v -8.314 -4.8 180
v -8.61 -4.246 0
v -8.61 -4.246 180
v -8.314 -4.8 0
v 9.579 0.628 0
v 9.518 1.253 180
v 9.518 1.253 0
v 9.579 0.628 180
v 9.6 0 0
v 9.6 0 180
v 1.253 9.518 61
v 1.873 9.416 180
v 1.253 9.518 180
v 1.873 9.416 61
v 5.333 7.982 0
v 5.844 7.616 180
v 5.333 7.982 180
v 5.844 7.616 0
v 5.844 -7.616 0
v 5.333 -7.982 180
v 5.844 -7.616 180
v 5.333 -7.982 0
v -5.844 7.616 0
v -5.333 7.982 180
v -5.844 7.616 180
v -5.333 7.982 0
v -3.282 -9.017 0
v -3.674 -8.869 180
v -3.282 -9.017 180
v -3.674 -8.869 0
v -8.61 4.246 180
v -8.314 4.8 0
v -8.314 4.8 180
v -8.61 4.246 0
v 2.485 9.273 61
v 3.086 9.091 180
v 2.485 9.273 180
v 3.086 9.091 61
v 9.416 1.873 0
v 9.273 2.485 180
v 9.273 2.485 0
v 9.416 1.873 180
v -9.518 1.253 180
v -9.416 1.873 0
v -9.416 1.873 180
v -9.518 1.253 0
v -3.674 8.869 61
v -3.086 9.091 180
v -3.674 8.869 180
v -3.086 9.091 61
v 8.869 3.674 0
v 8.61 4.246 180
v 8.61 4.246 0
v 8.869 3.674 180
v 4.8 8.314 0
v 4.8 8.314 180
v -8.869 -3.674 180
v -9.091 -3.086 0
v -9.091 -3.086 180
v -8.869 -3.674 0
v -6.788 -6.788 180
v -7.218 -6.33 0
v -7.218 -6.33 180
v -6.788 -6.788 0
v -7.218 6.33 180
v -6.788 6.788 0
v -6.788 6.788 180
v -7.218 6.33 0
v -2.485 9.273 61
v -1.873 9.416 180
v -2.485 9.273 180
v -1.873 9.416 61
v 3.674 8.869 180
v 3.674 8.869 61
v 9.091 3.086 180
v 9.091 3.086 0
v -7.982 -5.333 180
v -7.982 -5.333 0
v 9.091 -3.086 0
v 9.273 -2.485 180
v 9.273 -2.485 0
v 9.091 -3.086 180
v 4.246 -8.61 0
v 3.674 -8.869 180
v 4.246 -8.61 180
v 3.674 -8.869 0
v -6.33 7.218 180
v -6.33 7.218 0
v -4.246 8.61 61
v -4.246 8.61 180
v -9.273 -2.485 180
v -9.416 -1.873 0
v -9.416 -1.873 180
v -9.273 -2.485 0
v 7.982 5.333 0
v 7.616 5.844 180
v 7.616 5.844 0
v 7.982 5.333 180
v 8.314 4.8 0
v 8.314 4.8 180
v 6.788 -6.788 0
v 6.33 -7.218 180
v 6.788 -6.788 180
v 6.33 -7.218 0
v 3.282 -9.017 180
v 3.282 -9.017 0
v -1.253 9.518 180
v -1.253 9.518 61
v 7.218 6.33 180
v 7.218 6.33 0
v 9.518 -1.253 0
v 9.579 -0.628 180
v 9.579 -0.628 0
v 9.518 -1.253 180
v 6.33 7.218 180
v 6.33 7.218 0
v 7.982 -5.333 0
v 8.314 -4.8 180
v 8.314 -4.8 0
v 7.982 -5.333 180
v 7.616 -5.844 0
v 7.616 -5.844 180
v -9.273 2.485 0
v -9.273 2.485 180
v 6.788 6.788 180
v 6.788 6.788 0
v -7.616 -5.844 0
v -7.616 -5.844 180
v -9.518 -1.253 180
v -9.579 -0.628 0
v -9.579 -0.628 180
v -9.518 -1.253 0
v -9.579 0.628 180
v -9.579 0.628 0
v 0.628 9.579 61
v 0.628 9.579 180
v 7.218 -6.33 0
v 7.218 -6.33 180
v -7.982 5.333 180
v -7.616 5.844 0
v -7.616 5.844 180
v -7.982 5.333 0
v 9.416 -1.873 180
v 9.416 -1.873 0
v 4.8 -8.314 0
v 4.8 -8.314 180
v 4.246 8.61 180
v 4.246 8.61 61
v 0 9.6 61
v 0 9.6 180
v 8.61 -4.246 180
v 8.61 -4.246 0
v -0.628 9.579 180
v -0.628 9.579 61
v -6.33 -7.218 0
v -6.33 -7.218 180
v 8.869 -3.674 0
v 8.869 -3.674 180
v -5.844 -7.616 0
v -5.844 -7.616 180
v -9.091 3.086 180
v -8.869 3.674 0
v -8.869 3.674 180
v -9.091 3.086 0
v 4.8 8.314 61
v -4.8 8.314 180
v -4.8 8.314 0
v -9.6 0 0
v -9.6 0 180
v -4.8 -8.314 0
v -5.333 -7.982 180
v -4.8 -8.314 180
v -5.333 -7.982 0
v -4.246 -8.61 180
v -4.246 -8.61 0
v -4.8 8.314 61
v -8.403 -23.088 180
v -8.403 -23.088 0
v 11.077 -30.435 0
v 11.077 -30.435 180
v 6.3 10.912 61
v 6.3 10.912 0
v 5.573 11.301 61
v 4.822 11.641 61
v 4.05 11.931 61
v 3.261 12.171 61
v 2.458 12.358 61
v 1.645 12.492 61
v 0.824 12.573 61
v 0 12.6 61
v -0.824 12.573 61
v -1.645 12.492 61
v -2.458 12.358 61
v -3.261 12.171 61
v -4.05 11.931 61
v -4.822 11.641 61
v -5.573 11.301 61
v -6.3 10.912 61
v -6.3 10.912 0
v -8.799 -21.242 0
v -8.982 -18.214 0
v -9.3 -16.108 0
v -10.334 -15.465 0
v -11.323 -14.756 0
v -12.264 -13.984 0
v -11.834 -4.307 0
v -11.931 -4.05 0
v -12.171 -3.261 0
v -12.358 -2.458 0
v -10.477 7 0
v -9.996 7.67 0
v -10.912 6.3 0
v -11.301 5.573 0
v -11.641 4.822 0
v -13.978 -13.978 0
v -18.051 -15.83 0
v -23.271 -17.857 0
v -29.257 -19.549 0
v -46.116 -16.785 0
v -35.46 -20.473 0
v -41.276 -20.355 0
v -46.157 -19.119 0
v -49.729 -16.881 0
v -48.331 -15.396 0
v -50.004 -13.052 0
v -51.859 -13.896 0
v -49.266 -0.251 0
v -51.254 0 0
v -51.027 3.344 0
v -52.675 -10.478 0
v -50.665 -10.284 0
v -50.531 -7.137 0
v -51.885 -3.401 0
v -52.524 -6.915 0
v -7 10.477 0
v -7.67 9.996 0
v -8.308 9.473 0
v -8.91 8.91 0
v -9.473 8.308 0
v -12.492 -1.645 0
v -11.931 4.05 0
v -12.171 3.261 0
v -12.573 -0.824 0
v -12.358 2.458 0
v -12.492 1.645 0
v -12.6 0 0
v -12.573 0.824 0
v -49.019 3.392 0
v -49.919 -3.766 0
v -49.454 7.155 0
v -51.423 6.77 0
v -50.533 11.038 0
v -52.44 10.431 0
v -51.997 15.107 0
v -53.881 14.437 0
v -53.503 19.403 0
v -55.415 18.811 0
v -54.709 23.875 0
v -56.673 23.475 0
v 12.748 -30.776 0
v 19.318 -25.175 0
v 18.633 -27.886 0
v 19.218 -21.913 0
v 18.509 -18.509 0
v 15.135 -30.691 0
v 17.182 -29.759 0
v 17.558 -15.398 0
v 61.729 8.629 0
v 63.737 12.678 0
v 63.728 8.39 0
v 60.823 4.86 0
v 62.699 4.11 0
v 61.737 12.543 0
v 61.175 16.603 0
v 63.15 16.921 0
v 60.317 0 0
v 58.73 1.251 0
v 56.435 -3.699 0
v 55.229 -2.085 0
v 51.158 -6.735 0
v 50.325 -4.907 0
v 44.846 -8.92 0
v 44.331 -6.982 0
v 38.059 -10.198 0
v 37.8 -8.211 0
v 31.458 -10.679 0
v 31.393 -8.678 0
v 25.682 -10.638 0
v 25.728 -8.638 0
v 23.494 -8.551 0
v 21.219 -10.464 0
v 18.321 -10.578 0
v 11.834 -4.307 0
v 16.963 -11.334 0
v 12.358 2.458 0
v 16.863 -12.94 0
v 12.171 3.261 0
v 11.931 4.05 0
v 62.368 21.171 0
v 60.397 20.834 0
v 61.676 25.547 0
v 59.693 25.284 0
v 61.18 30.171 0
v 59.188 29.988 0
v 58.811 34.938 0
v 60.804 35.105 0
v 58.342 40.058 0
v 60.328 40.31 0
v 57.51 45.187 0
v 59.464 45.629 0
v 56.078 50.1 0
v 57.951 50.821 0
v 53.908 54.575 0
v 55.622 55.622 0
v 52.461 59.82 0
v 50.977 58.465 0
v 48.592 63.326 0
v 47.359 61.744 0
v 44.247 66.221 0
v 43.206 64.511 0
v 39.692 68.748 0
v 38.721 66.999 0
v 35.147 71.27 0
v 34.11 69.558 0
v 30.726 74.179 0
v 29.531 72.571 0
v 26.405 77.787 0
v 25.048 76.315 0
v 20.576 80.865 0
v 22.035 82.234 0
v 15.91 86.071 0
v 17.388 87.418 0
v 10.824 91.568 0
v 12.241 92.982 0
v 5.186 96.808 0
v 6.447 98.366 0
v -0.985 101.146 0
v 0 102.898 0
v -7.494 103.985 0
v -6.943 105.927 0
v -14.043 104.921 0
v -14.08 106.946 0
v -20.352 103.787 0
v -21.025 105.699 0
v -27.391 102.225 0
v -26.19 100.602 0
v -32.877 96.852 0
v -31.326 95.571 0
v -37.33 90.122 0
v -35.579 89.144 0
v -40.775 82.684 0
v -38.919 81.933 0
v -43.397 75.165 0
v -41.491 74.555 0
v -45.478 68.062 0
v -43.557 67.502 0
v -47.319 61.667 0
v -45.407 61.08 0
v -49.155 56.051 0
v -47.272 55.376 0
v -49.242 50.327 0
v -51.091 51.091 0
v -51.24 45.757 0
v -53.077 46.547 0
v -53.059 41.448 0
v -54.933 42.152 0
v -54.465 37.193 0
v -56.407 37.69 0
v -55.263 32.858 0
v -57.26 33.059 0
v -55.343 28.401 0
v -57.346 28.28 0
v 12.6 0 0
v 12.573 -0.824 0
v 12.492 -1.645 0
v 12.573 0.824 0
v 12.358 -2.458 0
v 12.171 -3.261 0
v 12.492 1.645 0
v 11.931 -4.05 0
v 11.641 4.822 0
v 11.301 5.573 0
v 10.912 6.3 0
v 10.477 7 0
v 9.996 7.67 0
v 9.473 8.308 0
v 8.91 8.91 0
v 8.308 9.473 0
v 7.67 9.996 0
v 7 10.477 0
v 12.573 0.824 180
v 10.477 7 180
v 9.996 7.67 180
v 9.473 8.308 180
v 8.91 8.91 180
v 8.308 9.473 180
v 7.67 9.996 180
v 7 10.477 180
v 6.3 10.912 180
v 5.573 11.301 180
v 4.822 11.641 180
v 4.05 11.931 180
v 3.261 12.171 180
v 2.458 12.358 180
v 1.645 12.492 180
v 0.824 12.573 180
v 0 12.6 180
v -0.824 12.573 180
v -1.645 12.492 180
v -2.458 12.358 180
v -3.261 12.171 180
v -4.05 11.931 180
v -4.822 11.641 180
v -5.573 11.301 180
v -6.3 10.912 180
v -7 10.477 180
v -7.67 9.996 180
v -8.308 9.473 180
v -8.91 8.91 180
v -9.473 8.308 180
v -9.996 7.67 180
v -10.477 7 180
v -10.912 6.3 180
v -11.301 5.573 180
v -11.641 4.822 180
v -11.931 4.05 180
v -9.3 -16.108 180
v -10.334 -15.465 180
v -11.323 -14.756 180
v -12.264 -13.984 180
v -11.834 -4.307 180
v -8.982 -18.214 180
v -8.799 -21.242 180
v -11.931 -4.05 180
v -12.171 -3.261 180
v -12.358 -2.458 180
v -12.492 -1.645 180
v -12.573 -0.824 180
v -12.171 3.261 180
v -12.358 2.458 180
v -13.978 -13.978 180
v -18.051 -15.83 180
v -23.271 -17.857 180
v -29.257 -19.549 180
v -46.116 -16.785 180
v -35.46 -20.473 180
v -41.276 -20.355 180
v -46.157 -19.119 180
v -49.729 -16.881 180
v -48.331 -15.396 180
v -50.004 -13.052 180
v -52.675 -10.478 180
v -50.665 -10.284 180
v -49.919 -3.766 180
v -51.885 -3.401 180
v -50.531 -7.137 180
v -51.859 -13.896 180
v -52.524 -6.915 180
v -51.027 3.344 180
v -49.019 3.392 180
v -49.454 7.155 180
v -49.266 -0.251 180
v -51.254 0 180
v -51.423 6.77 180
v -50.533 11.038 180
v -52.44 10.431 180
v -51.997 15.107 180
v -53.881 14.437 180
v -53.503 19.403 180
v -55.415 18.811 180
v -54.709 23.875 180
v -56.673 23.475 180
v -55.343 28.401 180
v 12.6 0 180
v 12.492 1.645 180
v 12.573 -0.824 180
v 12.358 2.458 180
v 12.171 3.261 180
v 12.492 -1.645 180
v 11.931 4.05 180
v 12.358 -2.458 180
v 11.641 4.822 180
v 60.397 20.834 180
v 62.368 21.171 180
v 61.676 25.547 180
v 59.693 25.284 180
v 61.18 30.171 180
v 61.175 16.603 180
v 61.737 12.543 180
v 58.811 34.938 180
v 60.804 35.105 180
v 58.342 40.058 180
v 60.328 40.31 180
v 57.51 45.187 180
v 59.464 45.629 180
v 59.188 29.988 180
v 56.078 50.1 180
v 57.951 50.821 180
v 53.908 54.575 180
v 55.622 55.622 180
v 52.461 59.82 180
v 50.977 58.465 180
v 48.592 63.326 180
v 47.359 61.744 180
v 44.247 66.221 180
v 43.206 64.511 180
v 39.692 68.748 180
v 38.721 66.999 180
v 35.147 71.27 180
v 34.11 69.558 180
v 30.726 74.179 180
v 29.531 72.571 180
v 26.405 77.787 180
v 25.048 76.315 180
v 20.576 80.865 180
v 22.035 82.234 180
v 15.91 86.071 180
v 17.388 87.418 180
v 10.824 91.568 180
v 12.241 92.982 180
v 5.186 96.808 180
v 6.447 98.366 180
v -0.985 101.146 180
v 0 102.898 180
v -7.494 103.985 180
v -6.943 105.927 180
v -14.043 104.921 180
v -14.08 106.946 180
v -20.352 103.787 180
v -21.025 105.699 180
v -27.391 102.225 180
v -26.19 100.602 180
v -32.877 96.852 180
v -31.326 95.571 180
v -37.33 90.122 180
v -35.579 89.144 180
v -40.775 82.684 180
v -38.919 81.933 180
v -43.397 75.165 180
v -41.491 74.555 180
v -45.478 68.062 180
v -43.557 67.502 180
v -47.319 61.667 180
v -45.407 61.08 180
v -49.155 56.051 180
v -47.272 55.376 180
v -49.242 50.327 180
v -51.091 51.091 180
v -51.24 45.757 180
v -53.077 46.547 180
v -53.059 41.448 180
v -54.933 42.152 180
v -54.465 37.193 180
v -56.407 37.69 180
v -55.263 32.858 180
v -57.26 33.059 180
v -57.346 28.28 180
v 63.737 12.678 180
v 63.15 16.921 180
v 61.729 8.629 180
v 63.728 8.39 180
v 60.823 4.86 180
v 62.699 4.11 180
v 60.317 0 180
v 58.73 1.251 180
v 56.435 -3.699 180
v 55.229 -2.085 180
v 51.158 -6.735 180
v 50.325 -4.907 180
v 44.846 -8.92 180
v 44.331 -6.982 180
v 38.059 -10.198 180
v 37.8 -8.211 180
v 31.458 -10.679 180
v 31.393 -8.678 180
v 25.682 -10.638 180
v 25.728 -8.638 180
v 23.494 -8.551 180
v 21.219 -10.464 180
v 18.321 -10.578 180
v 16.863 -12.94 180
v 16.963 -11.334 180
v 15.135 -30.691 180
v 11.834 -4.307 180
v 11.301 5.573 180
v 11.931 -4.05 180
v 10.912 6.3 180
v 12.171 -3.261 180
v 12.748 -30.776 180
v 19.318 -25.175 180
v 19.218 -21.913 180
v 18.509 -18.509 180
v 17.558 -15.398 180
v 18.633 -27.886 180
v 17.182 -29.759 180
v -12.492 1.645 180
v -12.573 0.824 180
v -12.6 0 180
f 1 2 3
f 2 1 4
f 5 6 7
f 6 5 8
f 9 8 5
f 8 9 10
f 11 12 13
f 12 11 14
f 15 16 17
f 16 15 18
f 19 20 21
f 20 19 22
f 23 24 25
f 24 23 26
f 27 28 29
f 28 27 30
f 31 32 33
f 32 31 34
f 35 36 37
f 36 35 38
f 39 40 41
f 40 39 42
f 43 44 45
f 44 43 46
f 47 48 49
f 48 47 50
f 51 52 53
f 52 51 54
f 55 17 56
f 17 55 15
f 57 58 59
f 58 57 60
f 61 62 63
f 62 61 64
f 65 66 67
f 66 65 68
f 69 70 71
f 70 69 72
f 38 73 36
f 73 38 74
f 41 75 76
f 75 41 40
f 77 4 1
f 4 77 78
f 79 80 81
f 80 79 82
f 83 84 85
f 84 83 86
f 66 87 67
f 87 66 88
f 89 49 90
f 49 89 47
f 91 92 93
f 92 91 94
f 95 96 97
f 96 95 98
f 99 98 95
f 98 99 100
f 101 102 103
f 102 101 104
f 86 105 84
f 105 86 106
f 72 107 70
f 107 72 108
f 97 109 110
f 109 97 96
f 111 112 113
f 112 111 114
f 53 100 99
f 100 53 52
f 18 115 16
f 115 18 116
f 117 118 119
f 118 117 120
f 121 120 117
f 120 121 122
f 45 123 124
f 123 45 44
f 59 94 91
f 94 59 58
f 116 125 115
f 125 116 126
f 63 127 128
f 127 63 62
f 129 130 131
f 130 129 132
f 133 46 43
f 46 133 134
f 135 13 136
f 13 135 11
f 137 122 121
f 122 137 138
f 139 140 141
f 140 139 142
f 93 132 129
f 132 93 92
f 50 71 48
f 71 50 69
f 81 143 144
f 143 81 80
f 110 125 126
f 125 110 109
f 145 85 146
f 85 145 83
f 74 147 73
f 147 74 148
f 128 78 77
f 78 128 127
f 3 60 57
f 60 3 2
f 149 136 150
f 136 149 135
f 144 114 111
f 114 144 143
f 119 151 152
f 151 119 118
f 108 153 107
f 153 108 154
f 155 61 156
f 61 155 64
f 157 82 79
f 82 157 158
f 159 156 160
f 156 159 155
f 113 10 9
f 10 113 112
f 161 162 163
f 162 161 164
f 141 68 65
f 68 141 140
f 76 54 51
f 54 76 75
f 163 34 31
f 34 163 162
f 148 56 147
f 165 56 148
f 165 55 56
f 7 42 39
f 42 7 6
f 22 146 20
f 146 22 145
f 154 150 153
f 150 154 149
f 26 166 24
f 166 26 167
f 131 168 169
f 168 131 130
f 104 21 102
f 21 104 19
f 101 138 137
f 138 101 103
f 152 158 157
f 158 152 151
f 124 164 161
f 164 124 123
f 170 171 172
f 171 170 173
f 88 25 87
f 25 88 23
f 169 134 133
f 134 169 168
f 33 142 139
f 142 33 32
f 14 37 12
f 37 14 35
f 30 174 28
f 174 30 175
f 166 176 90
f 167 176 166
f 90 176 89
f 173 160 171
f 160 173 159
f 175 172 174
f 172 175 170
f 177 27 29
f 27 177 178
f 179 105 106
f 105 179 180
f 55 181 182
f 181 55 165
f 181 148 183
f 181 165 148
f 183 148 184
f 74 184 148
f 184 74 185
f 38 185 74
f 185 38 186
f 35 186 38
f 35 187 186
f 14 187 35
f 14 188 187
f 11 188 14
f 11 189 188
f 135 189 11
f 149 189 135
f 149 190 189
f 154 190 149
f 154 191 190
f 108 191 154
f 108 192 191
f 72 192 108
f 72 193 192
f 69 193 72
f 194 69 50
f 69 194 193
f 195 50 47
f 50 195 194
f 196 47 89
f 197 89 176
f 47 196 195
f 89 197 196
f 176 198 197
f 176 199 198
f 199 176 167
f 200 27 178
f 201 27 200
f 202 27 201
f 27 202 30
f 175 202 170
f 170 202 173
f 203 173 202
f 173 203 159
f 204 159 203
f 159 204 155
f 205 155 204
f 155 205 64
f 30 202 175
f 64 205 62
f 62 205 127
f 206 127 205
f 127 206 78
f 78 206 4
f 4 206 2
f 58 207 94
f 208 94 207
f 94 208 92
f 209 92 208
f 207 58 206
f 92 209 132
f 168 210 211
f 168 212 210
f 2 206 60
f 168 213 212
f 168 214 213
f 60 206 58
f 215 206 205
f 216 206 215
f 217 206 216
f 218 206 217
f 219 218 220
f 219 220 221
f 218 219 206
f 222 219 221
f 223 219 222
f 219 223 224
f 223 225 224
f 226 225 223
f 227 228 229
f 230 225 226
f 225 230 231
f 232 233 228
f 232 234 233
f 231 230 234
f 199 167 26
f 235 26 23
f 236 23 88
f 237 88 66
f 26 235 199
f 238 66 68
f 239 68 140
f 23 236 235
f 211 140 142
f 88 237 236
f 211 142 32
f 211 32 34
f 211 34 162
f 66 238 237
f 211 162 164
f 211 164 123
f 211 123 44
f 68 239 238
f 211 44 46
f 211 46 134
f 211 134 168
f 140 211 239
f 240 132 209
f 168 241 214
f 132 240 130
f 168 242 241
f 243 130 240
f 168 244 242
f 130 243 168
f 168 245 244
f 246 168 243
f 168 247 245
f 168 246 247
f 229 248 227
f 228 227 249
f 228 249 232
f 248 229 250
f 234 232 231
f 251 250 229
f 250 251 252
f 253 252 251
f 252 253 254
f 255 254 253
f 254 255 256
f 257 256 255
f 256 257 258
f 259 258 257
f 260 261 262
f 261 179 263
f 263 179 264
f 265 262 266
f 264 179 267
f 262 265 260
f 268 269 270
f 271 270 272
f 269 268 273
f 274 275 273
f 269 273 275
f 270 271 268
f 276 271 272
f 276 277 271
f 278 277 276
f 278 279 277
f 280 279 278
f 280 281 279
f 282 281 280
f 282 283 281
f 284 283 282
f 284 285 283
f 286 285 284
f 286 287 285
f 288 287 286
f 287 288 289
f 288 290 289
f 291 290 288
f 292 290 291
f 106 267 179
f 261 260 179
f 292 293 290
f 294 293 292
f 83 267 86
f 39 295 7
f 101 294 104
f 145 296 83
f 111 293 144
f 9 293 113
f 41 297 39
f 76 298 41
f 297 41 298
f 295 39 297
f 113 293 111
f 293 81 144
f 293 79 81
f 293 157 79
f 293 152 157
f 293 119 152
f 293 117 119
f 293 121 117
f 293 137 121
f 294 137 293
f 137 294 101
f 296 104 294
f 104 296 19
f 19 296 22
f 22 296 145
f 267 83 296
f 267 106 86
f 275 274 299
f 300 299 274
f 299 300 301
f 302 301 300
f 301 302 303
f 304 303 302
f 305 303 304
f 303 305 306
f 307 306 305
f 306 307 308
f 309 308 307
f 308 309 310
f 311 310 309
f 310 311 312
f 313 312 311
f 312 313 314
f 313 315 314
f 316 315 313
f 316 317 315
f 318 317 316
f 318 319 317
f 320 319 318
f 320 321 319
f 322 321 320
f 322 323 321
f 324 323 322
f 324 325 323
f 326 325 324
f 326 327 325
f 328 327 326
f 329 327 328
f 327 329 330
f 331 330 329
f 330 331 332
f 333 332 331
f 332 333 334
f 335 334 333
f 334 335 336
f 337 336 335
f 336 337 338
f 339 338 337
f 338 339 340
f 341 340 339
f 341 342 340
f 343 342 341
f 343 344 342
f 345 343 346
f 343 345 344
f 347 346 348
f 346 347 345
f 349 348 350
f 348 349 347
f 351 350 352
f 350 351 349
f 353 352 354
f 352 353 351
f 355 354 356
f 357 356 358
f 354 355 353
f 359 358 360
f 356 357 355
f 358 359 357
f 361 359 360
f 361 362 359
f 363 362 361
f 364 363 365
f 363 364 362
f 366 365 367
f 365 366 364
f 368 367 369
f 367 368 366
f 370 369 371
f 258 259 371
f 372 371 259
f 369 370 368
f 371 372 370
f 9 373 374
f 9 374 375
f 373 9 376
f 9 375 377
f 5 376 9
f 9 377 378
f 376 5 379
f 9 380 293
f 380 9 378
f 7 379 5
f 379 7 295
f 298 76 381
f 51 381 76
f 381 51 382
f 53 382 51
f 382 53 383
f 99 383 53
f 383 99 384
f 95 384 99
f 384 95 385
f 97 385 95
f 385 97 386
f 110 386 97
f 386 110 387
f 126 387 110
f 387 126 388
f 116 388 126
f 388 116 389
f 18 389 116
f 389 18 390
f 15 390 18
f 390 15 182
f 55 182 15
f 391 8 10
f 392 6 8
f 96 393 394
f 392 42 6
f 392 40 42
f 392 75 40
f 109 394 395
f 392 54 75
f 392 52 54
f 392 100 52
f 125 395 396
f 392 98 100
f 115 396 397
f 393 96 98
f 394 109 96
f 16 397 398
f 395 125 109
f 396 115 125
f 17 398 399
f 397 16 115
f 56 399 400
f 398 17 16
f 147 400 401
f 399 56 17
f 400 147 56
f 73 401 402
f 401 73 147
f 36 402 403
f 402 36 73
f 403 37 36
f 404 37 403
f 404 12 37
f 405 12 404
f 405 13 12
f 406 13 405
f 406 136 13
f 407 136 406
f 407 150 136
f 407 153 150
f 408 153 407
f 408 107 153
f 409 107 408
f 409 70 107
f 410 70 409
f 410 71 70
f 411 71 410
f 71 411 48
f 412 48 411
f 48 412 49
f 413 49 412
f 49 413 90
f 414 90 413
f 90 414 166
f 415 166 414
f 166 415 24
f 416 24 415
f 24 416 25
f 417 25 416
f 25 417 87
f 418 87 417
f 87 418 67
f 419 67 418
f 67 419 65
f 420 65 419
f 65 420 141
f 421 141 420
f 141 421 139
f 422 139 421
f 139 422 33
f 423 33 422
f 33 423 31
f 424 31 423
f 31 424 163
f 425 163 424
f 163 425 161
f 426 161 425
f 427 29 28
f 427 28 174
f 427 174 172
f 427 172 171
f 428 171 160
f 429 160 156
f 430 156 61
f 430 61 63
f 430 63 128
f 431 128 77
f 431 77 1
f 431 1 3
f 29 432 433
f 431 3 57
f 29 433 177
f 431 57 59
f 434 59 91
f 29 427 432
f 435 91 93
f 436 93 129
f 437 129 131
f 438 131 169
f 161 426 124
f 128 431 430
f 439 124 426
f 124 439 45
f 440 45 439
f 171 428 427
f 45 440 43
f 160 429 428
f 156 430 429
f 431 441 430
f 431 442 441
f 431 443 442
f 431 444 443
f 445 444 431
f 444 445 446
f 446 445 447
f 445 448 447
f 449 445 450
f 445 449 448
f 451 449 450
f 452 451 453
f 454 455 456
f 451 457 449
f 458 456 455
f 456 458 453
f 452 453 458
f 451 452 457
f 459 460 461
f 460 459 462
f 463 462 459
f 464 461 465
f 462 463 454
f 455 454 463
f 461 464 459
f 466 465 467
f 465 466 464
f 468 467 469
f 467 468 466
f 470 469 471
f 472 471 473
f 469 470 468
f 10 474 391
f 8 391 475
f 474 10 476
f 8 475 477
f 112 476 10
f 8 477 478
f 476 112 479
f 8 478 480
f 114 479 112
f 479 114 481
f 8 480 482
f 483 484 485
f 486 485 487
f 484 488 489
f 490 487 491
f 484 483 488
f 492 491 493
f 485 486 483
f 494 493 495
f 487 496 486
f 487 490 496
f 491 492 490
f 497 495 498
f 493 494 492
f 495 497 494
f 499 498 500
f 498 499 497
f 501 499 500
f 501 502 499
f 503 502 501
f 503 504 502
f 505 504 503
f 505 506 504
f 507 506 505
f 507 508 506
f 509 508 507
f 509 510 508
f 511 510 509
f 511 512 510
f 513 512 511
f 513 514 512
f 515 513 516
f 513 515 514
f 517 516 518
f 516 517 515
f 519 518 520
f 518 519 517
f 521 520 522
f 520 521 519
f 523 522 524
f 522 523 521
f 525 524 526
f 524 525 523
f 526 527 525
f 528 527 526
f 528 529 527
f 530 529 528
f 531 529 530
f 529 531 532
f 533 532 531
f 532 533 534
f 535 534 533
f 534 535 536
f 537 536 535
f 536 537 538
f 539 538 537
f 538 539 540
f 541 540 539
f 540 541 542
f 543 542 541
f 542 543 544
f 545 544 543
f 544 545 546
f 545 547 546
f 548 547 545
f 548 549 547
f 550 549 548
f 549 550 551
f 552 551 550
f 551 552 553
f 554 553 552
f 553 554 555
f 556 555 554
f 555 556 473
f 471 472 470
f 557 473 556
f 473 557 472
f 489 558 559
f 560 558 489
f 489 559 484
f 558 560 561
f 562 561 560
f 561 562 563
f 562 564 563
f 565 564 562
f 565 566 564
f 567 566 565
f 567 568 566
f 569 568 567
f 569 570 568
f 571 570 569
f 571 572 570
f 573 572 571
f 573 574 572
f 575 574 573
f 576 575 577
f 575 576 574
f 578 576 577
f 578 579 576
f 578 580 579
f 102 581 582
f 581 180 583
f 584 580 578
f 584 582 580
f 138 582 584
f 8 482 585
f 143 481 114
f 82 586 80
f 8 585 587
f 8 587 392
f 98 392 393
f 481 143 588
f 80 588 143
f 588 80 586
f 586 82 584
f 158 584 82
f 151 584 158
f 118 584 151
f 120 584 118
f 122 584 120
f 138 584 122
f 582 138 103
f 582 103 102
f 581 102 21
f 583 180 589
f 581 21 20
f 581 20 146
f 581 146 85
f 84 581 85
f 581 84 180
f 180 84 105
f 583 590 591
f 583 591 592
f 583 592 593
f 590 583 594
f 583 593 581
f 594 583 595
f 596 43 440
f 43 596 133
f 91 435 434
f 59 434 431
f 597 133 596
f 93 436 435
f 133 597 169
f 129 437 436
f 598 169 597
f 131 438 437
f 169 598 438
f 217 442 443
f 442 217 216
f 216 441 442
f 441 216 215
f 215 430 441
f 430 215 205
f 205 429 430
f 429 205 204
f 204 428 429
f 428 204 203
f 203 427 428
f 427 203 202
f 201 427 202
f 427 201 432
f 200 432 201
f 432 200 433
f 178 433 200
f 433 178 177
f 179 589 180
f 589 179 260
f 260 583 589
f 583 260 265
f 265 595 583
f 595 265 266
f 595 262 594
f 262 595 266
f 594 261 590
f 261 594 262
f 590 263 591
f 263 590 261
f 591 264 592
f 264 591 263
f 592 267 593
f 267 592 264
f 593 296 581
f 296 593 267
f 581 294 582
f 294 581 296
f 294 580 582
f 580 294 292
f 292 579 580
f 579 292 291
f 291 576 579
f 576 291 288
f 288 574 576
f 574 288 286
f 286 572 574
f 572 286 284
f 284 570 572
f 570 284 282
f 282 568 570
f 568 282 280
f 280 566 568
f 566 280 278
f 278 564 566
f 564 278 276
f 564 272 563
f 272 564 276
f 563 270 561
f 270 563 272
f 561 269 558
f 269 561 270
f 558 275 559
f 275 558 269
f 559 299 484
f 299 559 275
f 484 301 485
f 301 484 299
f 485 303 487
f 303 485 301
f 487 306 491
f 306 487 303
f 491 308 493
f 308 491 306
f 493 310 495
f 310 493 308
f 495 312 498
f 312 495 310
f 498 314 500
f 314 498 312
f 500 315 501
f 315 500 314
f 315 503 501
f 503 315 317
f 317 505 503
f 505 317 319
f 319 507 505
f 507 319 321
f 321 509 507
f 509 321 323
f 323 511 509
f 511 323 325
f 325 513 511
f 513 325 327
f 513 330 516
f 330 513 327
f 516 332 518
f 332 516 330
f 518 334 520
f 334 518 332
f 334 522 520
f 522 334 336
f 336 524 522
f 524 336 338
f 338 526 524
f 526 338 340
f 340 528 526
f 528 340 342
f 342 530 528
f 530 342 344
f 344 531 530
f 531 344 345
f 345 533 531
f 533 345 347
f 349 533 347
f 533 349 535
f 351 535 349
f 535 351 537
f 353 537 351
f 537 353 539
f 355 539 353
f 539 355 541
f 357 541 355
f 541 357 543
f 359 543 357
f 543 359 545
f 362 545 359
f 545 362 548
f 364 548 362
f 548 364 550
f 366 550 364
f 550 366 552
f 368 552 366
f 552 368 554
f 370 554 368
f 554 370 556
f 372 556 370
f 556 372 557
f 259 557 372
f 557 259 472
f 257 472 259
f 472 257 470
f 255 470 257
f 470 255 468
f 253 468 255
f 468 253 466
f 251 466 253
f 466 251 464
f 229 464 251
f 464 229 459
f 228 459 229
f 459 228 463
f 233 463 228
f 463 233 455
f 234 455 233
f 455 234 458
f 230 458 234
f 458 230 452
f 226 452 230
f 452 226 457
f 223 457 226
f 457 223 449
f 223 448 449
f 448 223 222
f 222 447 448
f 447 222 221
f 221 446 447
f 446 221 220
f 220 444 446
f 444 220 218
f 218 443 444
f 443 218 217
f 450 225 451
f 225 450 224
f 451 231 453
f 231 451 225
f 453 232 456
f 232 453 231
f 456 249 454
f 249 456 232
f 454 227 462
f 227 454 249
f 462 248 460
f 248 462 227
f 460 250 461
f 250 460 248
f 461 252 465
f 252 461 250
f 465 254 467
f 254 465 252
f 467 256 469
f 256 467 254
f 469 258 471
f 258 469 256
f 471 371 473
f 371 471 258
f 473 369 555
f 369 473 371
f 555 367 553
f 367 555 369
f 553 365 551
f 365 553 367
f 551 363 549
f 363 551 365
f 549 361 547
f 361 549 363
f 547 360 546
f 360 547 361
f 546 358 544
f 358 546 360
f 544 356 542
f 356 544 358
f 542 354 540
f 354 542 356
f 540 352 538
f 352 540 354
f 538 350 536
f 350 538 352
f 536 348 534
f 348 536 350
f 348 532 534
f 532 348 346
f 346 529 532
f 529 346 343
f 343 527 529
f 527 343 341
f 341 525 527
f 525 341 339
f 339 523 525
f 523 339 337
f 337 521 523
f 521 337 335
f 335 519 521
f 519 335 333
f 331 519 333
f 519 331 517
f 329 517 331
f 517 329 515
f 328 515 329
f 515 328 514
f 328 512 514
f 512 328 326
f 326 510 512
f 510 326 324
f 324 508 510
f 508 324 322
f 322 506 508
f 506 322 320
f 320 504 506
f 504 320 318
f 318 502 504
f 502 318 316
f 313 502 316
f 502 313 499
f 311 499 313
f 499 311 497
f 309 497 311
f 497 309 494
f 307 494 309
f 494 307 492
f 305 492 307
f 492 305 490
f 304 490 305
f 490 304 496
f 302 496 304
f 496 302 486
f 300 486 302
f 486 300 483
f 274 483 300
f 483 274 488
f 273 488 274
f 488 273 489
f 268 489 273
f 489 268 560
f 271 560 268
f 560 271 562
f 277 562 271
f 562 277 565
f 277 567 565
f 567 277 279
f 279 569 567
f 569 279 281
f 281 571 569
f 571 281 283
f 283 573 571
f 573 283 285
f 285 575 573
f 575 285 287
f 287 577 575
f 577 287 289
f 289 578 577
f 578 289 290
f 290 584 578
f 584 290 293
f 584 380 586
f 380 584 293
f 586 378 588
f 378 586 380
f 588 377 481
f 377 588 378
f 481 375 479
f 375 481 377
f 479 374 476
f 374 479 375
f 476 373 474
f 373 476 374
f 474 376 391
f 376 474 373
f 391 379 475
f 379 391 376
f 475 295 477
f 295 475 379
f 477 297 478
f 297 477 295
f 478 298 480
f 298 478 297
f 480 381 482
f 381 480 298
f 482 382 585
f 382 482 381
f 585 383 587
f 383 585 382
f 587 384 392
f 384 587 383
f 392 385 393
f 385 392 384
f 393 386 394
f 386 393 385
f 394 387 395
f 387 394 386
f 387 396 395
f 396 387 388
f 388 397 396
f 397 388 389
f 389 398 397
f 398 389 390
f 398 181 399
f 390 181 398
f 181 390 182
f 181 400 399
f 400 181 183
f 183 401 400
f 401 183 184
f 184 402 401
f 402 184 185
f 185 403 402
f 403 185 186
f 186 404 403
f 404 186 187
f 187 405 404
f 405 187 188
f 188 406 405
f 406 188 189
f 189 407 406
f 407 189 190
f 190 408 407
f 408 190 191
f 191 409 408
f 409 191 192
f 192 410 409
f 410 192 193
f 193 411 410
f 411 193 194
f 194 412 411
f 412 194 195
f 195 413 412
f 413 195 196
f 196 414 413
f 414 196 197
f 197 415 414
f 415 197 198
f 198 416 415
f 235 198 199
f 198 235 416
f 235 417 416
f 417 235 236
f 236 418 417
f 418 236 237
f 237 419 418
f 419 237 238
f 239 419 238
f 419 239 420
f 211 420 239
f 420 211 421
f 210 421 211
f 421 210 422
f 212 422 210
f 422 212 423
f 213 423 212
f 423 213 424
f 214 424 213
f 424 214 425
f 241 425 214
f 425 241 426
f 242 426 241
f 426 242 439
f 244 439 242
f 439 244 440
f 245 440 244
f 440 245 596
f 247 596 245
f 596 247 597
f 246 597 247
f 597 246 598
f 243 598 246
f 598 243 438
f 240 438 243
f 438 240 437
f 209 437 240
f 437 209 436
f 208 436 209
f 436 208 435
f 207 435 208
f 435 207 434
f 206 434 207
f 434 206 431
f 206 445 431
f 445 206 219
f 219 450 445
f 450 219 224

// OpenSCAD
// Lampenschirm für Stehlampe – organischer, wellenförmiger Querschnitt
// mit Klemmkragen, der in die Form integriert ist (keine D-Form mehr)
// Alle Maße in Millimetern (Regel: units-mm)
//
// Kontext: context/printer.md, context/tolerances.md und context/materials.md
// waren zum Zeitpunkt der Modellierung leer (siehe Regel: context-first).
// Annahmen aus dem Design-Dialog (siehe auch 001/002):
//   - Baubett >= 200mm Z-Höhe vorhanden -> Schirm wird als ein Teil,
//     stehend, in voller Höhe gedruckt.
//   - Klemmkragen als offener Federclip (C-Ring): Innendurchmesser 0.8mm
//     unter Stangendurchmesser (19.2mm ID auf 20mm Stange) für Vorspannung.
//   - E14-Fassung wird separat an der Stange montiert.
//
// Änderungen gegenüber 004 (Nutzer-Feedback: "Klemme muss auf einer Seite
// offen bleiben, wird seitlich an die Stange gesteckt, nicht von oben
// übergestülpt"):
//   - Logikfehler behoben: der Montagespalt (clip_gap_deg, Richtung -Y) wurde
//     bisher nur bis Radius clip_r_out+5 (~17.6mm) freigeschnitten. Der in
//     004 neu hinzugekommene massive Verbindungskeil (boss_bridge_2d) reicht
//     aber viel weiter nach außen (bis zur echten Außenwand, ~25-40mm+ an
//     dieser Stelle) - der Spalt war dadurch nach außen hin wieder mit
//     massivem Material verschlossen und die Stange konnte nicht seitlich
//     eingeclipst werden.
//   - Fix: der Montagespalt wird jetzt mit demselben großzügigen Radius wie
//     der Verbindungskeil selbst geschnitten (weit über jede mögliche
//     Wandausdehnung hinaus), sodass er garantiert bis zur echten
//     Außenoberfläche durchbricht - unabhängig davon, wie weit die Kontur an
//     dieser Stelle gerade herausragt.

// ---- Parameter ----
shade_height = 180;   // Gesamthöhe des Schirms
wall_t       = 2;     // Wandstärke Schirm (dünn für Lichtdurchlässigkeit)

rod_d      = 20;                 // Durchmesser der Metallstange
rod_r      = rod_d / 2;
clip_id    = 19.2;               // Innendurchmesser Klemmkragen (Vorspannung, ~0.8mm Untermaß)
clip_r_in  = clip_id / 2;
clip_wall  = 3;                  // Wandstärke Klemmkragen (dicker als Schirmwand, für Klemmkraft)
clip_r_out = clip_r_in + clip_wall;
clip_gap_deg = 40;               // Öffnungswinkel des C-Rings (Montagespalt, zeigt nach -Y)

socket_slot_deg    = 60;              // Öffnungswinkel des Fassungs-Schlitzes (Innenseite, +Y) - Annahme
socket_slot_height = shade_height / 3; // unteres Drittel der Klemme ist auf der Innenseite offen

// Organische Grundform (Fourier-Basis, Radius in mm ab Stangenmitte):
// front (θ=90°, +Y) ≈ 95mm, Seiten (θ=0°/180°) ≈ 50mm, Rückseite (θ=270°, -Y) ≈ 25mm
base_a0 = 55;
base_a1 = 35;
base_a2 = 5;

// Wellen-Überlagerung für den organischen/wellenförmigen Look
wave_amp1 = 9;   wave_freq1 = 4;  wave_phase1 = 40;
wave_amp2 = 5;   wave_freq2 = 7;  wave_phase2 = 115;

min_r = clip_r_out + 6;          // harte Untergrenze: Kontur darf den Klemmkragen nie schneiden
bridge_deg = 140;                // Öffnungswinkel des massiven Verbindungskeils, zentriert auf die Rückseite (270°)
cut_far = 300;                   // "unendlich" großer Radius für Schnitte, die garantiert bis nach außen durchbrechen sollen

$fn = 96;

// Radius der organischen Kontur in Abhängigkeit vom Winkel θ (Grad)
function organic_r(theta) =
    let(phi = theta - 90)
    let(base = base_a0 + base_a1 * cos(phi) + base_a2 * cos(2 * phi))
    let(wave = wave_amp1 * sin(wave_freq1 * theta + wave_phase1)
             + wave_amp2 * sin(wave_freq2 * theta + wave_phase2))
    max(base + wave, min_r);

// Geschlossenes 2D-Profil der organischen Außenkontur
module organic_outline() {
    step = 360 / $fn;
    polygon(points = [
        for (t = [0 : step : 360 - step])
            [organic_r(t) * cos(t), organic_r(t) * sin(t)]
    ]);
}

// Keilförmiger 2D-Ausschnitt, zentriert auf Winkel 0
module pie_wedge_2d(radius, angle_deg) {
    a = angle_deg / 2;
    polygon(points = [
        [0, 0],
        [radius * cos(a), radius * sin(a)],
        [radius * cos(-a), radius * sin(-a)]
    ]);
}

// Massiver Verbindungskeil zwischen Klemmkragen und Außenwand: die Original-
// Außenkontur (kein offset()) geschnitten auf einen Sektor um die Rückseite,
// komplett massiv gefüllt von der Mitte bis zur Außenwand. Berührt die
// Außenkontur direkt (garantierte Verbindung) und überdeckt den kompletten
// Klemmkragen (r bis clip_r_out), da bridge_deg > clip_gap_deg.
module boss_bridge_2d() {
    intersection() {
        organic_outline();
        rotate([0, 0, 270])
            pie_wedge_2d(cut_far, bridge_deg);
    }
}

// Voller Klemmkragen-Rohling (Bohrung/Spalt werden erst in 3D herausgeschnitten)
module collar_disk_2d() {
    circle(r = clip_r_out);
}

// 2D-Profil der Wand: normale 2mm-Schale überall + massiver Klemmkragen-
// Rohling + massiver Verbindungskeil zur Rückseite (garantiert verbunden)
module shell_with_boss_2d() {
    union() {
        difference() {
            organic_outline();
            offset(delta = -wall_t)
                organic_outline();
        }
        collar_disk_2d();
        boss_bridge_2d();
    }
}

module organic_shell() {
    linear_extrude(height = shade_height)
        shell_with_boss_2d();
}

// Radialer Schlitz von z0 bis z1, in Richtung facing_deg ausgerichtet
module radial_slot(radius, angle_deg, facing_deg, z0, z1) {
    translate([0, 0, z0])
        rotate([0, 0, facing_deg])
            linear_extrude(z1 - z0)
                pie_wedge_2d(radius, angle_deg);
}

// Alle Ausschnitte für die Klemme: durchgehende Stangenbohrung + Montagespalt
// (volle Höhe, -Y, bricht bis zur echten Außenwand durch, damit seitlich
// eingeclipst werden kann) + Fassungs-Schlitz (unteres Drittel, +Y, öffnet
// nur bis in den ohnehin dort schon hohlen Innenraum - kein Verbindungskeil
// auf dieser Seite, daher genügt der kleinere Radius)
module clamp_cutouts() {
    union() {
        translate([0, 0, -1])
            cylinder(r = clip_r_in, h = shade_height + 2);

        radial_slot(cut_far, clip_gap_deg, 270, -1, shade_height + 1);

        radial_slot(clip_r_out + 5, socket_slot_deg, 90, -1, socket_slot_height + 1);
    }
}

// render() erzwingt die vollständige (exakte) Boolesche Berechnung statt der
// schnellen OpenCSG-Live-Vorschau, damit die Klemme auch in der OpenSCAD-
// Vorschau (F5) korrekt dargestellt wird.
render(convexity = 10)
    difference() {
        organic_shell();
        clamp_cutouts();
    }
